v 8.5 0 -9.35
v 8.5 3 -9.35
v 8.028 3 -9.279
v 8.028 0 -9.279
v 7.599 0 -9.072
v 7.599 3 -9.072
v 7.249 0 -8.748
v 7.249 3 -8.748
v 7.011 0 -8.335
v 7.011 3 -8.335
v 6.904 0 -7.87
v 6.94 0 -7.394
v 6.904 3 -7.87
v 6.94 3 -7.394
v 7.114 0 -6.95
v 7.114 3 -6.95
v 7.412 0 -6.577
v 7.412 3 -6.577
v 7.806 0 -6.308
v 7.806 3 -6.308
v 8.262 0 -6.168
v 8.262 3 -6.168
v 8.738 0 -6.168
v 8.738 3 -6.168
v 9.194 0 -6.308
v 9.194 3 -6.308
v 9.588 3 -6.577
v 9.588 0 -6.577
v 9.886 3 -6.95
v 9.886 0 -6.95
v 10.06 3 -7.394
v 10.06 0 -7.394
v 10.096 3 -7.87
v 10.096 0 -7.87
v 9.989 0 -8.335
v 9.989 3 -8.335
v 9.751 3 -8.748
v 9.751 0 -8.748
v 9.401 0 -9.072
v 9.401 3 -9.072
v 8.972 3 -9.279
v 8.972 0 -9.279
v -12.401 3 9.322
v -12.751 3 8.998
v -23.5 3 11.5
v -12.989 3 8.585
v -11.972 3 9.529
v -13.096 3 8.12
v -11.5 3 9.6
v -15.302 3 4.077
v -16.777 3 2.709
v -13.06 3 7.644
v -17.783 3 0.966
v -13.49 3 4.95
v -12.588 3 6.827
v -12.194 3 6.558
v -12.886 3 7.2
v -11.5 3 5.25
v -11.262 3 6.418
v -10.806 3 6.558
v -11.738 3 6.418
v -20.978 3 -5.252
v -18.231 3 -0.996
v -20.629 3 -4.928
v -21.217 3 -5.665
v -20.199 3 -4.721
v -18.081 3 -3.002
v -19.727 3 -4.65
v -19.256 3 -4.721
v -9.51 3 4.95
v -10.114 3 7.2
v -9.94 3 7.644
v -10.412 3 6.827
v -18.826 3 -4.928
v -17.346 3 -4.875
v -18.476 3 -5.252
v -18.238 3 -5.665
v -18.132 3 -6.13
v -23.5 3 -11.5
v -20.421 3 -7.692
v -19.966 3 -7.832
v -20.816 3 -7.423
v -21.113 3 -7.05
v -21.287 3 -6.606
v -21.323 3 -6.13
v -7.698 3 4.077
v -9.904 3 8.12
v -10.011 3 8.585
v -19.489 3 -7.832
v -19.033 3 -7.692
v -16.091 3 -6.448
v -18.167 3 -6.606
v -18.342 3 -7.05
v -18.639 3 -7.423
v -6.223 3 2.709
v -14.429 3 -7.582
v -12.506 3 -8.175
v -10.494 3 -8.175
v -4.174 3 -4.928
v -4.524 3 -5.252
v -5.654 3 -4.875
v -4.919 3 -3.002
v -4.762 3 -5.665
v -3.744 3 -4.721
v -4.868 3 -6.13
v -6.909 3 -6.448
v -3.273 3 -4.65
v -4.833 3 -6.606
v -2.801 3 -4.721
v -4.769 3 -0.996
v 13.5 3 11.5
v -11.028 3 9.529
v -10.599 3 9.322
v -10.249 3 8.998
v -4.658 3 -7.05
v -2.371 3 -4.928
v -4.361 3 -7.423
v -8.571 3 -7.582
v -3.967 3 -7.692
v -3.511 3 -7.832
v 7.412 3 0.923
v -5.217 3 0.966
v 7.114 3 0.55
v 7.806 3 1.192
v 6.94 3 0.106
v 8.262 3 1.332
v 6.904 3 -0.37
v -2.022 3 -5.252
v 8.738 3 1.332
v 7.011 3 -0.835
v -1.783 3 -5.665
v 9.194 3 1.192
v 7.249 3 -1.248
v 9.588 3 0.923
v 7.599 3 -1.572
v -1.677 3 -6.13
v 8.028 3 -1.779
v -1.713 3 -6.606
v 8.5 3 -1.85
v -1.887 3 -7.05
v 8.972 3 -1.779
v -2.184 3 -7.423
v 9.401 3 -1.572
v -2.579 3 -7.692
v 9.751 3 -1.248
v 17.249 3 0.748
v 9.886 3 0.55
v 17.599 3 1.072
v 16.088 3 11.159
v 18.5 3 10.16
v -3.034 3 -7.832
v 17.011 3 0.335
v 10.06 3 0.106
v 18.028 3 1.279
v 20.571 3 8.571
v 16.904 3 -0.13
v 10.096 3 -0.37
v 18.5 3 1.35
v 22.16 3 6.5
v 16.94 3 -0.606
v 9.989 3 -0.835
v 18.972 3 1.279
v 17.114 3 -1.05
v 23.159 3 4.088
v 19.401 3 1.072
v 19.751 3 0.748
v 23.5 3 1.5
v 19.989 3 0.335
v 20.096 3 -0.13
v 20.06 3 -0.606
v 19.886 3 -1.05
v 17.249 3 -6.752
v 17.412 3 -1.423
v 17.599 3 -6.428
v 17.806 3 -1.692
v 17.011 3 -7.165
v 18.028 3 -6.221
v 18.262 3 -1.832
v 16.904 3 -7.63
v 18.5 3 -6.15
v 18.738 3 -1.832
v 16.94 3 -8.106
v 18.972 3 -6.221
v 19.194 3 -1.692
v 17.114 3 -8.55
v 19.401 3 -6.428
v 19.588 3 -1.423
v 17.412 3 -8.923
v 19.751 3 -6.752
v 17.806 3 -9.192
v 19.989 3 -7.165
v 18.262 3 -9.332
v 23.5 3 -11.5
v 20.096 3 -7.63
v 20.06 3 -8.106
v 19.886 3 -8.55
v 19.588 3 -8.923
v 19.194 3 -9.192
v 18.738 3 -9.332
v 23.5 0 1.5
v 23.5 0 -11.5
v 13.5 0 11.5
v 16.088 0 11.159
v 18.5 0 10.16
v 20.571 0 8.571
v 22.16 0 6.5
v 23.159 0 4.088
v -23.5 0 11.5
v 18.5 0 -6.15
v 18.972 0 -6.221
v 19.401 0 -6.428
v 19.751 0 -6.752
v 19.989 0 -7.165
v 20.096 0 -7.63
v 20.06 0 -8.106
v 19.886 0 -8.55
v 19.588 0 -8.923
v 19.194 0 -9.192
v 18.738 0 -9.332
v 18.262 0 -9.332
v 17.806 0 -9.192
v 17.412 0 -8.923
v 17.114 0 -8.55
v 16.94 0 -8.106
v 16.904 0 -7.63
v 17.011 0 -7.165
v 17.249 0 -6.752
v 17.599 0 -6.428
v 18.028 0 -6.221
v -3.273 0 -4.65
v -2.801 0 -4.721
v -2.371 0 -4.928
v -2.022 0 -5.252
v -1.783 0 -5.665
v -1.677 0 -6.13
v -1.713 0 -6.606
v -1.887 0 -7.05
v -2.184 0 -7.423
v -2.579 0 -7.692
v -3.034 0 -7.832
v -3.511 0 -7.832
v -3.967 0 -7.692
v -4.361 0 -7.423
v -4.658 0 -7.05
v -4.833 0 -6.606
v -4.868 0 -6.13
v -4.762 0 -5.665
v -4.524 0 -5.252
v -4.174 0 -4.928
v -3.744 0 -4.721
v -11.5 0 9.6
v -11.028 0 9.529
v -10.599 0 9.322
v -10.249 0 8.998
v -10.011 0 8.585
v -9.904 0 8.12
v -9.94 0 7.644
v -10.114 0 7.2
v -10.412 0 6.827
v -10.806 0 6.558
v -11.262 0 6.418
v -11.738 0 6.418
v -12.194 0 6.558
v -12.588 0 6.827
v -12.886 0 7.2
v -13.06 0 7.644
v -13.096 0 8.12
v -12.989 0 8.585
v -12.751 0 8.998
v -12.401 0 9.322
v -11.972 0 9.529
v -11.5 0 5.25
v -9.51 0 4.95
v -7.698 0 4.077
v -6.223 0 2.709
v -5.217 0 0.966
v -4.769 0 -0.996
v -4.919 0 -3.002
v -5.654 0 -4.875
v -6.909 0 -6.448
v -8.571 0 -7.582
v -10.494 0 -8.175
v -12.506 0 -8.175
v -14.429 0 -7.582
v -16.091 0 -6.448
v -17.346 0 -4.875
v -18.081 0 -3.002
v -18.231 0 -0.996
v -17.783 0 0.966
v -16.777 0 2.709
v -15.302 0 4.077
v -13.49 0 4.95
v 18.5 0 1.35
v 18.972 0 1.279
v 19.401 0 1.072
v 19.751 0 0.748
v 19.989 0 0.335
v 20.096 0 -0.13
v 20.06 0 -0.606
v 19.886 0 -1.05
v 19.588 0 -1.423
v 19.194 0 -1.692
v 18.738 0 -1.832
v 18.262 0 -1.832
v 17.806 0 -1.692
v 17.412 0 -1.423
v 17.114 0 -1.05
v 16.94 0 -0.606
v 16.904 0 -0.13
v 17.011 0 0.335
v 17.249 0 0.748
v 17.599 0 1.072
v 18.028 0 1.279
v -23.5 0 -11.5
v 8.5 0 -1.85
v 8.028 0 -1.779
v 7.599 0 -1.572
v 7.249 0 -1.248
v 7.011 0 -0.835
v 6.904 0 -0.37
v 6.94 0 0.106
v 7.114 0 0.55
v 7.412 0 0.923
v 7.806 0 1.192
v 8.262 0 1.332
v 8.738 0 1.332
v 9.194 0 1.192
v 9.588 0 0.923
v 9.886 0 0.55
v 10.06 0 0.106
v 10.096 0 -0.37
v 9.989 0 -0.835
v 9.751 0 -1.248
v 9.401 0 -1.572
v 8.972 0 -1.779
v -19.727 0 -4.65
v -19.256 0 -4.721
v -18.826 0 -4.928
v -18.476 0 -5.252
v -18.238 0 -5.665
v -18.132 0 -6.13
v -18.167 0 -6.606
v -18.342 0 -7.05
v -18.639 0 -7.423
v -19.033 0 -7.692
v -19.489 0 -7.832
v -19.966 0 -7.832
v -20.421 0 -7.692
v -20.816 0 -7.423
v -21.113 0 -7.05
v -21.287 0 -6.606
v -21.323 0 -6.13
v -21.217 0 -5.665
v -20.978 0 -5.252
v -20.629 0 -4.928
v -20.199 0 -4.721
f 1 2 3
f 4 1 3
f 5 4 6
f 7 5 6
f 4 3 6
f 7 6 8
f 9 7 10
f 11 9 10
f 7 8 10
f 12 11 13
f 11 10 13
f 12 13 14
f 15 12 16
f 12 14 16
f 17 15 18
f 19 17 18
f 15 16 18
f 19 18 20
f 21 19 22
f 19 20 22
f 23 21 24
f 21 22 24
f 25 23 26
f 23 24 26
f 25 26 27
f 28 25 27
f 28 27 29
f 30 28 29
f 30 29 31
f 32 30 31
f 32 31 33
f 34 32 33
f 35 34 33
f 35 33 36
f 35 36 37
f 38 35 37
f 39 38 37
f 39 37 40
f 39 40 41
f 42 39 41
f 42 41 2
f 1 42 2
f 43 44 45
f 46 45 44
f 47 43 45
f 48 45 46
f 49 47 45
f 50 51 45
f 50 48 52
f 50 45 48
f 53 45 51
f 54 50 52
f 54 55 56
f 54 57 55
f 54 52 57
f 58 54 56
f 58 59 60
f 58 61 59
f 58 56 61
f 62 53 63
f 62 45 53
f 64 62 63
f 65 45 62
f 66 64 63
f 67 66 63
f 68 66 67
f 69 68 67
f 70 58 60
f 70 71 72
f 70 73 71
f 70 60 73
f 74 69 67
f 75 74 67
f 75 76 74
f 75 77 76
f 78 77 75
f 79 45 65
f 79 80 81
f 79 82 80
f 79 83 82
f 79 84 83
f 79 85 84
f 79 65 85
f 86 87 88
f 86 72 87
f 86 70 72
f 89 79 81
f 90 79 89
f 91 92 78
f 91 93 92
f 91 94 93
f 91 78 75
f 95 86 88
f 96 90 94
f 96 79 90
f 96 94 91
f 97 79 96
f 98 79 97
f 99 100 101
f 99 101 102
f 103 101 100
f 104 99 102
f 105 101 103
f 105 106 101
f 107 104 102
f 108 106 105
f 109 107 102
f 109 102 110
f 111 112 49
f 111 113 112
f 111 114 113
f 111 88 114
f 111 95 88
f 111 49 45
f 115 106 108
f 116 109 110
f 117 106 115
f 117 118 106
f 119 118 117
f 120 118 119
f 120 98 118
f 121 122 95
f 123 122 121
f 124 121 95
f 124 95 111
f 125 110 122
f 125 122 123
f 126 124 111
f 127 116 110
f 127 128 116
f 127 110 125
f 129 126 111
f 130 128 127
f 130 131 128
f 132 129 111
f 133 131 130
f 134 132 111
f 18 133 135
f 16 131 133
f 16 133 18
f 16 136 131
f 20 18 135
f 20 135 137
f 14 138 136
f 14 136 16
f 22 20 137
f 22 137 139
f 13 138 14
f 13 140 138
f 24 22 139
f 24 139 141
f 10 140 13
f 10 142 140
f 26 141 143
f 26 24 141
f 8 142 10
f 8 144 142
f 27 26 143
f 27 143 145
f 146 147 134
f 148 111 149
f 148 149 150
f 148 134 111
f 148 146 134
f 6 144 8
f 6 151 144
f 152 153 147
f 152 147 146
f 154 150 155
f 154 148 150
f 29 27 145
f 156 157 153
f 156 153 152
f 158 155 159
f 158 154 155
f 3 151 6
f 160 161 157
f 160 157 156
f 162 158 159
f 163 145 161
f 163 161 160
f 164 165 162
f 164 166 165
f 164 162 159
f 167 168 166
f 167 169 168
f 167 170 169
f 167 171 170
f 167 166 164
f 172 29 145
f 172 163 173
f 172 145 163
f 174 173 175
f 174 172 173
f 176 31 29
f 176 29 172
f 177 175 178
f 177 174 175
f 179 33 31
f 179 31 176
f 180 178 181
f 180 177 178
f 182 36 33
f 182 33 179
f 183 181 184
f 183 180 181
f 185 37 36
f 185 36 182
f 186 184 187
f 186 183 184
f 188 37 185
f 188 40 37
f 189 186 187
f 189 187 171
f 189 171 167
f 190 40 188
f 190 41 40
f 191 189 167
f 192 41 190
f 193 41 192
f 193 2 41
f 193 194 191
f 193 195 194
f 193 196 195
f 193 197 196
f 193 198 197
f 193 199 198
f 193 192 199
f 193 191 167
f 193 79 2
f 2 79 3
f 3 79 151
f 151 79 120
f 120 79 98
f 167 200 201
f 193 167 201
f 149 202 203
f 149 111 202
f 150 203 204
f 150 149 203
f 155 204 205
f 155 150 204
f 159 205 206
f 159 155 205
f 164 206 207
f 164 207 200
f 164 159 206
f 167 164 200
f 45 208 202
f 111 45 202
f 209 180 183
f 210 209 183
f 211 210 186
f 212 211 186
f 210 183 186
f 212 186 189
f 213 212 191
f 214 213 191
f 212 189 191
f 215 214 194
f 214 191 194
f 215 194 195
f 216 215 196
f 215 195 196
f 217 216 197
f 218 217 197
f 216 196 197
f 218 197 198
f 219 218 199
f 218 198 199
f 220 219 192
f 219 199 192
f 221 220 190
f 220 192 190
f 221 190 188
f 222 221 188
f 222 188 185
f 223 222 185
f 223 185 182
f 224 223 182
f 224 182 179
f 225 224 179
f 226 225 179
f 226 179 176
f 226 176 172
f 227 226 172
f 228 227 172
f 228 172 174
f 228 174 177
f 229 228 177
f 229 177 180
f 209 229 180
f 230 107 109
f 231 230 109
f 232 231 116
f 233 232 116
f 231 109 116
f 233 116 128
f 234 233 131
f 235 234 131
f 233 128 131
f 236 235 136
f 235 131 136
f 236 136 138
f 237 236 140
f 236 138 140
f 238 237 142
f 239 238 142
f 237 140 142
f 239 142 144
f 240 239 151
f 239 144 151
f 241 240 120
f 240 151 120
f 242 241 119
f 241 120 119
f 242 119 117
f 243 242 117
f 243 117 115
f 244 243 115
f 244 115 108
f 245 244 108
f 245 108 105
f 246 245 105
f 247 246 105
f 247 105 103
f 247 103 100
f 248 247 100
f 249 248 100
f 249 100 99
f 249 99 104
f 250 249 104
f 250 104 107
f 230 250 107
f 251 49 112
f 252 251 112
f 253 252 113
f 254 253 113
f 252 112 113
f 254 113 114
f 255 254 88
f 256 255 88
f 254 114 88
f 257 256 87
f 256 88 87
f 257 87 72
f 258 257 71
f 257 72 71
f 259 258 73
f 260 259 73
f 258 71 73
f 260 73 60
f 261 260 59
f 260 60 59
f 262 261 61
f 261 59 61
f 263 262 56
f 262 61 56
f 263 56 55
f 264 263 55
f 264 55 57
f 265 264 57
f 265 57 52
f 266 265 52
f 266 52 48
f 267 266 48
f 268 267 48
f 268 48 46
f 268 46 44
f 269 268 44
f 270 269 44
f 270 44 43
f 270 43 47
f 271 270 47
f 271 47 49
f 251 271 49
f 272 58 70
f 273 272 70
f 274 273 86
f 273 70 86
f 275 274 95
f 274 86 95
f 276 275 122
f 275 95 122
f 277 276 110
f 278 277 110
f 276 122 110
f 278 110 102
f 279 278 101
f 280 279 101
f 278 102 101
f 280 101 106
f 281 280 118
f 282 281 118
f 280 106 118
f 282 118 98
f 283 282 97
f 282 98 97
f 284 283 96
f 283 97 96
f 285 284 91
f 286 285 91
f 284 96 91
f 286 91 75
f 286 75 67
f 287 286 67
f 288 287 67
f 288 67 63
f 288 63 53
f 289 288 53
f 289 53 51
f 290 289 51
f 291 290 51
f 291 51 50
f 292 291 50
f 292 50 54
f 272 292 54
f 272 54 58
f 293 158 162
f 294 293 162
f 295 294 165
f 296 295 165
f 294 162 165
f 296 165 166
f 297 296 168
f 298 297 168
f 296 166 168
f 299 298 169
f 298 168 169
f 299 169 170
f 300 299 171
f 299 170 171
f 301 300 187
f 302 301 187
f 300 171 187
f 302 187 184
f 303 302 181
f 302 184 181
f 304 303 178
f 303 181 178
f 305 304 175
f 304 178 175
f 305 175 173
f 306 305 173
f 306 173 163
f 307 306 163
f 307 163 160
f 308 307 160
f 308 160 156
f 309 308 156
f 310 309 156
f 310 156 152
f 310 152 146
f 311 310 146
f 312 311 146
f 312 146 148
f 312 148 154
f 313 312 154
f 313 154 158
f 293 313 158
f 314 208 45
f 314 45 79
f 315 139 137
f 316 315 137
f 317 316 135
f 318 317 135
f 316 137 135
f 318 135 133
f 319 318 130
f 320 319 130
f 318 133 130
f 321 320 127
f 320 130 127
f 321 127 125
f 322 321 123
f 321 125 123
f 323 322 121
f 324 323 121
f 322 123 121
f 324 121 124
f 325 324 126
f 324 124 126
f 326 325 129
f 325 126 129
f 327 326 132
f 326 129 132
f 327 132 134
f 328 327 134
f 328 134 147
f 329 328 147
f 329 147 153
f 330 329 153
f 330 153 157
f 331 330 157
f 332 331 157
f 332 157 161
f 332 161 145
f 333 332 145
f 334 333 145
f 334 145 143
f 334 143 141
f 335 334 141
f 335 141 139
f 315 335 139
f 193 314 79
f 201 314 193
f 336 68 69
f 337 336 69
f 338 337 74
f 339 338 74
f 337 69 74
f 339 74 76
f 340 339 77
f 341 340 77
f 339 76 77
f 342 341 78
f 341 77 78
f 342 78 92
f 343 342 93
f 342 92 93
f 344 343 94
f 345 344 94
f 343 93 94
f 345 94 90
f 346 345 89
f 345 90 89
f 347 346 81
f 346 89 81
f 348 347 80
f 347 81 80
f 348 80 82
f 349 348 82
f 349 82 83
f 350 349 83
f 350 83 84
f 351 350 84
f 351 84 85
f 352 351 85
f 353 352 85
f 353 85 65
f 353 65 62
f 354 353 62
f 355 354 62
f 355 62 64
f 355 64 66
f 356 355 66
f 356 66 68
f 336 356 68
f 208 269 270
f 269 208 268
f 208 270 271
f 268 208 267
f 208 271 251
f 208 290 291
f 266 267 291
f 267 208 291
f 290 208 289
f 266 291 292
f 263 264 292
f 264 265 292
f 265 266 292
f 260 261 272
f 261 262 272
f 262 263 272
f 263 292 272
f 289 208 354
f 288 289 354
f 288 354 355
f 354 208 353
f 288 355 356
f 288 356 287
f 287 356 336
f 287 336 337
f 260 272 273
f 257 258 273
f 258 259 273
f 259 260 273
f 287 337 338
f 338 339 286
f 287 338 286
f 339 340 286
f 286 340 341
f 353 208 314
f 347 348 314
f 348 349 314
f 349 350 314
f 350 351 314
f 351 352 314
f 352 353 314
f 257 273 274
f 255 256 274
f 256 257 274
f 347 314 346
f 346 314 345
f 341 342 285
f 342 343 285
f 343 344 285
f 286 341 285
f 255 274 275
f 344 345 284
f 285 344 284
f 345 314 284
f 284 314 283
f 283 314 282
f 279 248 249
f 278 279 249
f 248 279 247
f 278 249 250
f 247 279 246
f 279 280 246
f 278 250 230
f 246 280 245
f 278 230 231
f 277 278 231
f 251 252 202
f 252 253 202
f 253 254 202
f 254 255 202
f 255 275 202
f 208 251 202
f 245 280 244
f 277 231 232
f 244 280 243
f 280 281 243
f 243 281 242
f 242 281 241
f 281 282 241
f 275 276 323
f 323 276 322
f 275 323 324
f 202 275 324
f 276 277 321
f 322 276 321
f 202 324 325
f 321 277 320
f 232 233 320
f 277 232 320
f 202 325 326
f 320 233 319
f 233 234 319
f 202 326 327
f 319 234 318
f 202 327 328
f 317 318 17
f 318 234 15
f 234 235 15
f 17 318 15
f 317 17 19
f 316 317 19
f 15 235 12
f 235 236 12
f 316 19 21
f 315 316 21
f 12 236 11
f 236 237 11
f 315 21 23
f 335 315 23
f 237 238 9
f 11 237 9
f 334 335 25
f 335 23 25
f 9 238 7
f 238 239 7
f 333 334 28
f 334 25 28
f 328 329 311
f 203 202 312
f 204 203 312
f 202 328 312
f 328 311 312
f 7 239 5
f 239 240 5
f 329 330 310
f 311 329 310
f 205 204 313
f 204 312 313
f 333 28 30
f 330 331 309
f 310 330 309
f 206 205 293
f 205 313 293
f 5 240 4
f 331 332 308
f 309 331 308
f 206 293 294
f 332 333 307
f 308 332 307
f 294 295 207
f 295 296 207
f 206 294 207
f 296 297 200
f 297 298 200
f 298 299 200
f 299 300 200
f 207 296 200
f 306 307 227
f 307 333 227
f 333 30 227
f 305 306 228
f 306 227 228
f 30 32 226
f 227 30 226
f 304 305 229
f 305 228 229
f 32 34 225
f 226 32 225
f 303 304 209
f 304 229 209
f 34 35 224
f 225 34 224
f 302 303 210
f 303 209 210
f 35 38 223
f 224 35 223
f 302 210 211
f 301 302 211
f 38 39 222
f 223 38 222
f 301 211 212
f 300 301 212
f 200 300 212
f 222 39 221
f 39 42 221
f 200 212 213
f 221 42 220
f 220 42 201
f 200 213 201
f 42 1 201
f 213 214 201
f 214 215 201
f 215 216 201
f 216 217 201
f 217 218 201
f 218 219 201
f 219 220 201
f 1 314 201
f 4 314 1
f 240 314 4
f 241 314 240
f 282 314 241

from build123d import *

# Parameters (mm, degrees)
SKETCH_1_W          = 47
SKETCH_1_H          = 23
EXTRUDE_1_DEPTH     = 3
SKETCH_2_R          = 1.6
SKETCH_2_R_2        = 6.75
CUT_EXTRUDE_1_DEPTH = 27.334388165
FILLET_1_R          = 10


with BuildPart() as part:
    # 草图1 → 凸台-拉伸1 (new body)
    with BuildSketch(Plane(origin=(0, 0, 0), x_dir=(1, 0, 0), z_dir=(0, 1, 0))):
        Rectangle(SKETCH_1_W, SKETCH_1_H)
    extrude(amount=EXTRUDE_1_DEPTH)

    # 草图2 → 切除-拉伸1 (cut, through all)
    with BuildSketch(Plane(origin=(0, 3, 0), x_dir=(1, 0, 0), z_dir=(0, 1, 0))):
        with Locations(Location((-19.727241336, 6.25, 0), (0, 0, 270))):
            Circle(SKETCH_2_R)
        with Locations(Location((-11.5, -8, 0), (0, 0, 270))):
            Circle(SKETCH_2_R)
        with Locations(Location((-3.272758664, 6.25, 0), (0, 0, 270))):
            Circle(SKETCH_2_R)
        with Locations(Location((-11.5, 1.5, 0), (0, 0, 270))):
            Circle(SKETCH_2_R_2)
        with Locations(Location((18.5, 7.75, 0), (0, 0, 270))):
            Circle(SKETCH_2_R)
        with Locations(Location((18.5, 0.25, 0), (0, 0, 270))):
            Circle(SKETCH_2_R)
        with Locations(Location((8.5, 0.25, 0), (0, 0, 90))):
            Circle(SKETCH_2_R)
        with Locations(Location((8.5, 7.75, 0), (0, 0, 90))):
            Circle(SKETCH_2_R)
    extrude(amount=-CUT_EXTRUDE_1_DEPTH, mode=Mode.SUBTRACT)

    # 圆角1
    fillet_1_edges = [part.edges().sort_by_distance(p)[0] for p in [
        (23.5, 1.5, 11.5),
    ]]
    fillet(fillet_1_edges, radius=FILLET_1_R)


solid = part.part
